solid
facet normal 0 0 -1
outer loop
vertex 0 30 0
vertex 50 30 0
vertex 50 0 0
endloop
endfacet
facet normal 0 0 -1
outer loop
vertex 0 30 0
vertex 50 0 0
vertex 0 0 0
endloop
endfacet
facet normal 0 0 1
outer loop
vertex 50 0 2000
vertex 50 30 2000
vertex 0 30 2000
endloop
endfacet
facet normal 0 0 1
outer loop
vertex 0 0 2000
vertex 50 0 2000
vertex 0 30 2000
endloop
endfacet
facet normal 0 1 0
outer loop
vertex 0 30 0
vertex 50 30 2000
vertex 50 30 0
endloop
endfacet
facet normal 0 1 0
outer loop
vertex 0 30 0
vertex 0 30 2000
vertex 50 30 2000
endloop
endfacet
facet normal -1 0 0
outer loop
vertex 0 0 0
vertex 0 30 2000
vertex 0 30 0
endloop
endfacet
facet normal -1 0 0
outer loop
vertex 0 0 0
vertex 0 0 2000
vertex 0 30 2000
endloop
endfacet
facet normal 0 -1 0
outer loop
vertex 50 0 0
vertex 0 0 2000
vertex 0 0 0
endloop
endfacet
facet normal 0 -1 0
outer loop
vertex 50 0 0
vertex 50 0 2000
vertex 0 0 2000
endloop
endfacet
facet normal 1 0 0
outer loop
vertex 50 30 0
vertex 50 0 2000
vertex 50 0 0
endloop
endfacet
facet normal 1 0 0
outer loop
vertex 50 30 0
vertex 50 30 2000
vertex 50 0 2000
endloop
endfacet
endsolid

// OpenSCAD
/*
square bar
   a
 ###
 # #  b  
 ### 
*/

module simple_profile_S(a,b, length) {
    echo(material="<b>square bar</b>", a, b, length);
    linear_extrude( height = length ) {
        polygon(
            points = [
                [0,0],
                [a,0],
                [a,b],
                [0,b],
            ],
            paths = [
                [0,1,2,3],
            ]
        );
    }
}

simple_profile_S(50,30, 2000);
